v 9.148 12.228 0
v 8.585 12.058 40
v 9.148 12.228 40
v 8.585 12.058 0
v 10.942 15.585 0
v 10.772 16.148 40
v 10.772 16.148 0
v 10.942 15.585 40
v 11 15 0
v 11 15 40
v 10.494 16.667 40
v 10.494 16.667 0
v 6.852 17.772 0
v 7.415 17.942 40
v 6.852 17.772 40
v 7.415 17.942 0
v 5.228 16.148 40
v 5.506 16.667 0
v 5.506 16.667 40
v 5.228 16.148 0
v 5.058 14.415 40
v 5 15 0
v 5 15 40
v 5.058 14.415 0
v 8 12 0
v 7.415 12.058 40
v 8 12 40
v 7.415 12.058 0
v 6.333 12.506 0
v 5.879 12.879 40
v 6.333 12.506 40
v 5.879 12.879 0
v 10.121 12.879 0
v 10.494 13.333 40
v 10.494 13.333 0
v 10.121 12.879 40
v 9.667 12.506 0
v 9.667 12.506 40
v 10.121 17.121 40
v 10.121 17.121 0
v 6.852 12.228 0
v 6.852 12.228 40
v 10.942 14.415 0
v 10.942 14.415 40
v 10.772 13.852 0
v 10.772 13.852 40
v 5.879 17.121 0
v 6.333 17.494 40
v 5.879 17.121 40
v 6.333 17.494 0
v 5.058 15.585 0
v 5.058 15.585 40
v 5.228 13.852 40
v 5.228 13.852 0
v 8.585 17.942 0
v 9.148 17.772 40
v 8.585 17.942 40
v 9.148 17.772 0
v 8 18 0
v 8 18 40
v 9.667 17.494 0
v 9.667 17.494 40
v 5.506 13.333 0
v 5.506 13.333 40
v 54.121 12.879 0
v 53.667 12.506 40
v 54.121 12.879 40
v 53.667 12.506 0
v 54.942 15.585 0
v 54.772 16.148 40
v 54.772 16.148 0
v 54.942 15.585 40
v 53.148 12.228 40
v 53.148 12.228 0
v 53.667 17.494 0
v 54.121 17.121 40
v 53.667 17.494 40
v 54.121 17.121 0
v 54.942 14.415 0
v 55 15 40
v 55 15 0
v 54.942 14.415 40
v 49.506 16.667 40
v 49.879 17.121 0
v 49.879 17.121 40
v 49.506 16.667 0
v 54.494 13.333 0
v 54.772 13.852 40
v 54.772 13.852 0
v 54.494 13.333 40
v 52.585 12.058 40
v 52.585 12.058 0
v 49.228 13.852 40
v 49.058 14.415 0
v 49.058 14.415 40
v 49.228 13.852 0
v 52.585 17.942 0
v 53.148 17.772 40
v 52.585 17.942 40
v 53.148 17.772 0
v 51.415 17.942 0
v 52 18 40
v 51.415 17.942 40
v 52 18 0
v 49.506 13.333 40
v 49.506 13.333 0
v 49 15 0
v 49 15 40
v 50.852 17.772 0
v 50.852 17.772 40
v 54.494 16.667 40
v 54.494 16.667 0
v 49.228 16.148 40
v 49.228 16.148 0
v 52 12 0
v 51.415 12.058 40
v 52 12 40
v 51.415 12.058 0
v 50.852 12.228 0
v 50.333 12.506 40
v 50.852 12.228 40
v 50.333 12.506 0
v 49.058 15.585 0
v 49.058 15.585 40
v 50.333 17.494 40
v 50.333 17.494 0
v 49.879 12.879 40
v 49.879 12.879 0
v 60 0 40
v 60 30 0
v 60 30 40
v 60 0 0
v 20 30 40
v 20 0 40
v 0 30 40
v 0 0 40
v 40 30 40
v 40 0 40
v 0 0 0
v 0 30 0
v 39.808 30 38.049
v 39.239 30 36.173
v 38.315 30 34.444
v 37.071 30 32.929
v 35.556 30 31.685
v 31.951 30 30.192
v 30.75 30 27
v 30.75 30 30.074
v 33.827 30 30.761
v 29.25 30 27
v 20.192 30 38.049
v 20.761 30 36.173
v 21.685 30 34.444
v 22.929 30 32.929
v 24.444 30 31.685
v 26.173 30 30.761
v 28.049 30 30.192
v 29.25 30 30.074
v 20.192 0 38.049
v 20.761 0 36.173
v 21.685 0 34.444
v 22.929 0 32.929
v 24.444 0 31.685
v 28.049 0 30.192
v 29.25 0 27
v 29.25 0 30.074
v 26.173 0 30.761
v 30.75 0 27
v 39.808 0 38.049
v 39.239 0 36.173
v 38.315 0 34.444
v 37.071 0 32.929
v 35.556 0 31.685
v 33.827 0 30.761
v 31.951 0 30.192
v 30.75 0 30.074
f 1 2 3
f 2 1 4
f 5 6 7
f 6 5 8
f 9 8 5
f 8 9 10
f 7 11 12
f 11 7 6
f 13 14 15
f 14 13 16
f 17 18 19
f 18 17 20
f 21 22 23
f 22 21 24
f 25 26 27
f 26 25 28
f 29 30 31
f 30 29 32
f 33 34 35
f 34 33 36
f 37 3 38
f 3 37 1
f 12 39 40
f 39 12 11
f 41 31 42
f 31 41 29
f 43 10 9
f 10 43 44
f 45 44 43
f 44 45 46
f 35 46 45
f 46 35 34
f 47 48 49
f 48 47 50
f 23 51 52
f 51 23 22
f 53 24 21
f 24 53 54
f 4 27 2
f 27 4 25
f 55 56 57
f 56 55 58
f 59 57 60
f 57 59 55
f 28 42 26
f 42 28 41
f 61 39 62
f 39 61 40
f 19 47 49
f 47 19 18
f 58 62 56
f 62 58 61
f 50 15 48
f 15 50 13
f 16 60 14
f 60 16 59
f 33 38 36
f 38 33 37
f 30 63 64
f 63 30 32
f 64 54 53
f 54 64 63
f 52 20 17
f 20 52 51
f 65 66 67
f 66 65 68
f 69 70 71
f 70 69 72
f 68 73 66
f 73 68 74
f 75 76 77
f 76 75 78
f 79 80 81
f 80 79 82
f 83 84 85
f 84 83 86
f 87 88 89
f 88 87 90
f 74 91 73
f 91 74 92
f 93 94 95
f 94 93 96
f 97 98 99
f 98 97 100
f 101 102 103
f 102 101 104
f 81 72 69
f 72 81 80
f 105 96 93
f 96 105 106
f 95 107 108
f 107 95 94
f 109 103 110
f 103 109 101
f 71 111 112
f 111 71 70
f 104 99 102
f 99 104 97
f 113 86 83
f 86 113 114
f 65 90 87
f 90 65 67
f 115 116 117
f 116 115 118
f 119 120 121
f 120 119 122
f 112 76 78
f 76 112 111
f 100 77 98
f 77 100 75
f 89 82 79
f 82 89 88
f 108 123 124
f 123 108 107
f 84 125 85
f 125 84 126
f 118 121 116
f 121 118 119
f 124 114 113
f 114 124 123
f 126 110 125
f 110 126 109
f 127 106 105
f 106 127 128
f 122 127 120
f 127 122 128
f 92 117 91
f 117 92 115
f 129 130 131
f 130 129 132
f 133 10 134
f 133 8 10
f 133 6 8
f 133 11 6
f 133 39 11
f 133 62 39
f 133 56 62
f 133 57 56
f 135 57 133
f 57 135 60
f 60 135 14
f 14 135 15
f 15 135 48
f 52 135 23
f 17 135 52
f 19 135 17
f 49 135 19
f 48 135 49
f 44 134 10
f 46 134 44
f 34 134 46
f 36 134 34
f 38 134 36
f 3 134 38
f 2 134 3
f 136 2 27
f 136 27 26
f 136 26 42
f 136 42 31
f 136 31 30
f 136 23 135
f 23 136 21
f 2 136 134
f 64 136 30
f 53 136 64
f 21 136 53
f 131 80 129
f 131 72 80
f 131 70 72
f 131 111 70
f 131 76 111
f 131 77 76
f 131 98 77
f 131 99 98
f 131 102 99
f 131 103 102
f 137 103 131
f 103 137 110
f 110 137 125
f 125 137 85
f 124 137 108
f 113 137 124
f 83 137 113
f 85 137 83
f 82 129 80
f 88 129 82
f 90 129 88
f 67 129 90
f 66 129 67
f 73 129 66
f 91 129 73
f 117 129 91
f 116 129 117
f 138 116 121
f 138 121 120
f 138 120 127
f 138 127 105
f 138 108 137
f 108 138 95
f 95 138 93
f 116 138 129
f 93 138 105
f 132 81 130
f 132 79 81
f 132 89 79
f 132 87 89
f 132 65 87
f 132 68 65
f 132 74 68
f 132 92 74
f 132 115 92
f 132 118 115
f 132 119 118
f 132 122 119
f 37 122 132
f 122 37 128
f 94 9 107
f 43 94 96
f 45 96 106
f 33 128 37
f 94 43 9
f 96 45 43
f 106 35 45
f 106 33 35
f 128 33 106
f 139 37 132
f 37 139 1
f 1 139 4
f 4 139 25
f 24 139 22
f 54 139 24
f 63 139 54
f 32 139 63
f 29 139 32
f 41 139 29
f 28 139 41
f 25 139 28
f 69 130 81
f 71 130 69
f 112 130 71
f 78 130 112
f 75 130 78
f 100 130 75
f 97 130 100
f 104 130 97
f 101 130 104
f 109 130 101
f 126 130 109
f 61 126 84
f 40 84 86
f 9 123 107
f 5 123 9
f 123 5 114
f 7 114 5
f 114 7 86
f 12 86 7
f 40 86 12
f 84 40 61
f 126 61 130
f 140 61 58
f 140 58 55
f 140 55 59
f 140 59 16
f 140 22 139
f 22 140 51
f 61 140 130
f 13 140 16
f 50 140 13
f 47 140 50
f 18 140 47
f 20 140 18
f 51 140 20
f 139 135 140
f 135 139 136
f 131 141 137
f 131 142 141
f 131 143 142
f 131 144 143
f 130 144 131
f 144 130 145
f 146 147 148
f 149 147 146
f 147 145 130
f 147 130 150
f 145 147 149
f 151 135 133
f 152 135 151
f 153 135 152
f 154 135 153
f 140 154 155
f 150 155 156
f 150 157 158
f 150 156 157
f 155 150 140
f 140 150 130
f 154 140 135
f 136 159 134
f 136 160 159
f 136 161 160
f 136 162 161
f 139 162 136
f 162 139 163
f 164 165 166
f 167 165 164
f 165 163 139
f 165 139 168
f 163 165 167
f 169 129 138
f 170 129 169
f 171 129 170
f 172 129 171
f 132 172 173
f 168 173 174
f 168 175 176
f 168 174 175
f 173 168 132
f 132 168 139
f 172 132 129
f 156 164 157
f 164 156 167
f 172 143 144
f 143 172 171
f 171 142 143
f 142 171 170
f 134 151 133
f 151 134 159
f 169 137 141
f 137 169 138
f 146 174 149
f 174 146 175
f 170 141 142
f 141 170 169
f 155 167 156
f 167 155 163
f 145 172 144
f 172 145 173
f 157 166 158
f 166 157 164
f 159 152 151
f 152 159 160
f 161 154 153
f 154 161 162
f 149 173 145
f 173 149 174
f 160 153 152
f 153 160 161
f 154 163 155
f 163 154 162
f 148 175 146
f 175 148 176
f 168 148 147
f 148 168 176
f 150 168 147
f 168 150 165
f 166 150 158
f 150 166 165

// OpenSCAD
$fn = 32;

// ----------------------------------------------------------------------
// Saddle clamp: split shaft clamp
// ----------------------------------------------------------------------

// --- parameters (mm) ---
blk_l = 60;               // block length, X
blk_w = 30;               // block width, Y
blk_h = 40;               // block height
clamp_r = 10;             // shaft groove radius
hole_r = 3;               // bolt hole radius
hole_m = 8;               // bolt hole margin from the ends
saw_w = 1.5;              // saw kerf width

saw_depth = clamp_r + 3;  // saw kerf depth

difference() {
  cube([blk_l, blk_w, blk_h]);
  translate([blk_l / 2, -1, blk_h])
    rotate([-90, 0, 0])
      cylinder(h = blk_w + 2, r = clamp_r);
  for (sx = [0, 1])
    translate([sx ? blk_l - hole_m : hole_m, blk_w / 2, -1])
      cylinder(r = hole_r, h = blk_h + 2);
  translate([blk_l / 2 - saw_w / 2, -1, blk_h - saw_depth])
    cube([saw_w, blk_w + 2, saw_depth + 1]);
}
